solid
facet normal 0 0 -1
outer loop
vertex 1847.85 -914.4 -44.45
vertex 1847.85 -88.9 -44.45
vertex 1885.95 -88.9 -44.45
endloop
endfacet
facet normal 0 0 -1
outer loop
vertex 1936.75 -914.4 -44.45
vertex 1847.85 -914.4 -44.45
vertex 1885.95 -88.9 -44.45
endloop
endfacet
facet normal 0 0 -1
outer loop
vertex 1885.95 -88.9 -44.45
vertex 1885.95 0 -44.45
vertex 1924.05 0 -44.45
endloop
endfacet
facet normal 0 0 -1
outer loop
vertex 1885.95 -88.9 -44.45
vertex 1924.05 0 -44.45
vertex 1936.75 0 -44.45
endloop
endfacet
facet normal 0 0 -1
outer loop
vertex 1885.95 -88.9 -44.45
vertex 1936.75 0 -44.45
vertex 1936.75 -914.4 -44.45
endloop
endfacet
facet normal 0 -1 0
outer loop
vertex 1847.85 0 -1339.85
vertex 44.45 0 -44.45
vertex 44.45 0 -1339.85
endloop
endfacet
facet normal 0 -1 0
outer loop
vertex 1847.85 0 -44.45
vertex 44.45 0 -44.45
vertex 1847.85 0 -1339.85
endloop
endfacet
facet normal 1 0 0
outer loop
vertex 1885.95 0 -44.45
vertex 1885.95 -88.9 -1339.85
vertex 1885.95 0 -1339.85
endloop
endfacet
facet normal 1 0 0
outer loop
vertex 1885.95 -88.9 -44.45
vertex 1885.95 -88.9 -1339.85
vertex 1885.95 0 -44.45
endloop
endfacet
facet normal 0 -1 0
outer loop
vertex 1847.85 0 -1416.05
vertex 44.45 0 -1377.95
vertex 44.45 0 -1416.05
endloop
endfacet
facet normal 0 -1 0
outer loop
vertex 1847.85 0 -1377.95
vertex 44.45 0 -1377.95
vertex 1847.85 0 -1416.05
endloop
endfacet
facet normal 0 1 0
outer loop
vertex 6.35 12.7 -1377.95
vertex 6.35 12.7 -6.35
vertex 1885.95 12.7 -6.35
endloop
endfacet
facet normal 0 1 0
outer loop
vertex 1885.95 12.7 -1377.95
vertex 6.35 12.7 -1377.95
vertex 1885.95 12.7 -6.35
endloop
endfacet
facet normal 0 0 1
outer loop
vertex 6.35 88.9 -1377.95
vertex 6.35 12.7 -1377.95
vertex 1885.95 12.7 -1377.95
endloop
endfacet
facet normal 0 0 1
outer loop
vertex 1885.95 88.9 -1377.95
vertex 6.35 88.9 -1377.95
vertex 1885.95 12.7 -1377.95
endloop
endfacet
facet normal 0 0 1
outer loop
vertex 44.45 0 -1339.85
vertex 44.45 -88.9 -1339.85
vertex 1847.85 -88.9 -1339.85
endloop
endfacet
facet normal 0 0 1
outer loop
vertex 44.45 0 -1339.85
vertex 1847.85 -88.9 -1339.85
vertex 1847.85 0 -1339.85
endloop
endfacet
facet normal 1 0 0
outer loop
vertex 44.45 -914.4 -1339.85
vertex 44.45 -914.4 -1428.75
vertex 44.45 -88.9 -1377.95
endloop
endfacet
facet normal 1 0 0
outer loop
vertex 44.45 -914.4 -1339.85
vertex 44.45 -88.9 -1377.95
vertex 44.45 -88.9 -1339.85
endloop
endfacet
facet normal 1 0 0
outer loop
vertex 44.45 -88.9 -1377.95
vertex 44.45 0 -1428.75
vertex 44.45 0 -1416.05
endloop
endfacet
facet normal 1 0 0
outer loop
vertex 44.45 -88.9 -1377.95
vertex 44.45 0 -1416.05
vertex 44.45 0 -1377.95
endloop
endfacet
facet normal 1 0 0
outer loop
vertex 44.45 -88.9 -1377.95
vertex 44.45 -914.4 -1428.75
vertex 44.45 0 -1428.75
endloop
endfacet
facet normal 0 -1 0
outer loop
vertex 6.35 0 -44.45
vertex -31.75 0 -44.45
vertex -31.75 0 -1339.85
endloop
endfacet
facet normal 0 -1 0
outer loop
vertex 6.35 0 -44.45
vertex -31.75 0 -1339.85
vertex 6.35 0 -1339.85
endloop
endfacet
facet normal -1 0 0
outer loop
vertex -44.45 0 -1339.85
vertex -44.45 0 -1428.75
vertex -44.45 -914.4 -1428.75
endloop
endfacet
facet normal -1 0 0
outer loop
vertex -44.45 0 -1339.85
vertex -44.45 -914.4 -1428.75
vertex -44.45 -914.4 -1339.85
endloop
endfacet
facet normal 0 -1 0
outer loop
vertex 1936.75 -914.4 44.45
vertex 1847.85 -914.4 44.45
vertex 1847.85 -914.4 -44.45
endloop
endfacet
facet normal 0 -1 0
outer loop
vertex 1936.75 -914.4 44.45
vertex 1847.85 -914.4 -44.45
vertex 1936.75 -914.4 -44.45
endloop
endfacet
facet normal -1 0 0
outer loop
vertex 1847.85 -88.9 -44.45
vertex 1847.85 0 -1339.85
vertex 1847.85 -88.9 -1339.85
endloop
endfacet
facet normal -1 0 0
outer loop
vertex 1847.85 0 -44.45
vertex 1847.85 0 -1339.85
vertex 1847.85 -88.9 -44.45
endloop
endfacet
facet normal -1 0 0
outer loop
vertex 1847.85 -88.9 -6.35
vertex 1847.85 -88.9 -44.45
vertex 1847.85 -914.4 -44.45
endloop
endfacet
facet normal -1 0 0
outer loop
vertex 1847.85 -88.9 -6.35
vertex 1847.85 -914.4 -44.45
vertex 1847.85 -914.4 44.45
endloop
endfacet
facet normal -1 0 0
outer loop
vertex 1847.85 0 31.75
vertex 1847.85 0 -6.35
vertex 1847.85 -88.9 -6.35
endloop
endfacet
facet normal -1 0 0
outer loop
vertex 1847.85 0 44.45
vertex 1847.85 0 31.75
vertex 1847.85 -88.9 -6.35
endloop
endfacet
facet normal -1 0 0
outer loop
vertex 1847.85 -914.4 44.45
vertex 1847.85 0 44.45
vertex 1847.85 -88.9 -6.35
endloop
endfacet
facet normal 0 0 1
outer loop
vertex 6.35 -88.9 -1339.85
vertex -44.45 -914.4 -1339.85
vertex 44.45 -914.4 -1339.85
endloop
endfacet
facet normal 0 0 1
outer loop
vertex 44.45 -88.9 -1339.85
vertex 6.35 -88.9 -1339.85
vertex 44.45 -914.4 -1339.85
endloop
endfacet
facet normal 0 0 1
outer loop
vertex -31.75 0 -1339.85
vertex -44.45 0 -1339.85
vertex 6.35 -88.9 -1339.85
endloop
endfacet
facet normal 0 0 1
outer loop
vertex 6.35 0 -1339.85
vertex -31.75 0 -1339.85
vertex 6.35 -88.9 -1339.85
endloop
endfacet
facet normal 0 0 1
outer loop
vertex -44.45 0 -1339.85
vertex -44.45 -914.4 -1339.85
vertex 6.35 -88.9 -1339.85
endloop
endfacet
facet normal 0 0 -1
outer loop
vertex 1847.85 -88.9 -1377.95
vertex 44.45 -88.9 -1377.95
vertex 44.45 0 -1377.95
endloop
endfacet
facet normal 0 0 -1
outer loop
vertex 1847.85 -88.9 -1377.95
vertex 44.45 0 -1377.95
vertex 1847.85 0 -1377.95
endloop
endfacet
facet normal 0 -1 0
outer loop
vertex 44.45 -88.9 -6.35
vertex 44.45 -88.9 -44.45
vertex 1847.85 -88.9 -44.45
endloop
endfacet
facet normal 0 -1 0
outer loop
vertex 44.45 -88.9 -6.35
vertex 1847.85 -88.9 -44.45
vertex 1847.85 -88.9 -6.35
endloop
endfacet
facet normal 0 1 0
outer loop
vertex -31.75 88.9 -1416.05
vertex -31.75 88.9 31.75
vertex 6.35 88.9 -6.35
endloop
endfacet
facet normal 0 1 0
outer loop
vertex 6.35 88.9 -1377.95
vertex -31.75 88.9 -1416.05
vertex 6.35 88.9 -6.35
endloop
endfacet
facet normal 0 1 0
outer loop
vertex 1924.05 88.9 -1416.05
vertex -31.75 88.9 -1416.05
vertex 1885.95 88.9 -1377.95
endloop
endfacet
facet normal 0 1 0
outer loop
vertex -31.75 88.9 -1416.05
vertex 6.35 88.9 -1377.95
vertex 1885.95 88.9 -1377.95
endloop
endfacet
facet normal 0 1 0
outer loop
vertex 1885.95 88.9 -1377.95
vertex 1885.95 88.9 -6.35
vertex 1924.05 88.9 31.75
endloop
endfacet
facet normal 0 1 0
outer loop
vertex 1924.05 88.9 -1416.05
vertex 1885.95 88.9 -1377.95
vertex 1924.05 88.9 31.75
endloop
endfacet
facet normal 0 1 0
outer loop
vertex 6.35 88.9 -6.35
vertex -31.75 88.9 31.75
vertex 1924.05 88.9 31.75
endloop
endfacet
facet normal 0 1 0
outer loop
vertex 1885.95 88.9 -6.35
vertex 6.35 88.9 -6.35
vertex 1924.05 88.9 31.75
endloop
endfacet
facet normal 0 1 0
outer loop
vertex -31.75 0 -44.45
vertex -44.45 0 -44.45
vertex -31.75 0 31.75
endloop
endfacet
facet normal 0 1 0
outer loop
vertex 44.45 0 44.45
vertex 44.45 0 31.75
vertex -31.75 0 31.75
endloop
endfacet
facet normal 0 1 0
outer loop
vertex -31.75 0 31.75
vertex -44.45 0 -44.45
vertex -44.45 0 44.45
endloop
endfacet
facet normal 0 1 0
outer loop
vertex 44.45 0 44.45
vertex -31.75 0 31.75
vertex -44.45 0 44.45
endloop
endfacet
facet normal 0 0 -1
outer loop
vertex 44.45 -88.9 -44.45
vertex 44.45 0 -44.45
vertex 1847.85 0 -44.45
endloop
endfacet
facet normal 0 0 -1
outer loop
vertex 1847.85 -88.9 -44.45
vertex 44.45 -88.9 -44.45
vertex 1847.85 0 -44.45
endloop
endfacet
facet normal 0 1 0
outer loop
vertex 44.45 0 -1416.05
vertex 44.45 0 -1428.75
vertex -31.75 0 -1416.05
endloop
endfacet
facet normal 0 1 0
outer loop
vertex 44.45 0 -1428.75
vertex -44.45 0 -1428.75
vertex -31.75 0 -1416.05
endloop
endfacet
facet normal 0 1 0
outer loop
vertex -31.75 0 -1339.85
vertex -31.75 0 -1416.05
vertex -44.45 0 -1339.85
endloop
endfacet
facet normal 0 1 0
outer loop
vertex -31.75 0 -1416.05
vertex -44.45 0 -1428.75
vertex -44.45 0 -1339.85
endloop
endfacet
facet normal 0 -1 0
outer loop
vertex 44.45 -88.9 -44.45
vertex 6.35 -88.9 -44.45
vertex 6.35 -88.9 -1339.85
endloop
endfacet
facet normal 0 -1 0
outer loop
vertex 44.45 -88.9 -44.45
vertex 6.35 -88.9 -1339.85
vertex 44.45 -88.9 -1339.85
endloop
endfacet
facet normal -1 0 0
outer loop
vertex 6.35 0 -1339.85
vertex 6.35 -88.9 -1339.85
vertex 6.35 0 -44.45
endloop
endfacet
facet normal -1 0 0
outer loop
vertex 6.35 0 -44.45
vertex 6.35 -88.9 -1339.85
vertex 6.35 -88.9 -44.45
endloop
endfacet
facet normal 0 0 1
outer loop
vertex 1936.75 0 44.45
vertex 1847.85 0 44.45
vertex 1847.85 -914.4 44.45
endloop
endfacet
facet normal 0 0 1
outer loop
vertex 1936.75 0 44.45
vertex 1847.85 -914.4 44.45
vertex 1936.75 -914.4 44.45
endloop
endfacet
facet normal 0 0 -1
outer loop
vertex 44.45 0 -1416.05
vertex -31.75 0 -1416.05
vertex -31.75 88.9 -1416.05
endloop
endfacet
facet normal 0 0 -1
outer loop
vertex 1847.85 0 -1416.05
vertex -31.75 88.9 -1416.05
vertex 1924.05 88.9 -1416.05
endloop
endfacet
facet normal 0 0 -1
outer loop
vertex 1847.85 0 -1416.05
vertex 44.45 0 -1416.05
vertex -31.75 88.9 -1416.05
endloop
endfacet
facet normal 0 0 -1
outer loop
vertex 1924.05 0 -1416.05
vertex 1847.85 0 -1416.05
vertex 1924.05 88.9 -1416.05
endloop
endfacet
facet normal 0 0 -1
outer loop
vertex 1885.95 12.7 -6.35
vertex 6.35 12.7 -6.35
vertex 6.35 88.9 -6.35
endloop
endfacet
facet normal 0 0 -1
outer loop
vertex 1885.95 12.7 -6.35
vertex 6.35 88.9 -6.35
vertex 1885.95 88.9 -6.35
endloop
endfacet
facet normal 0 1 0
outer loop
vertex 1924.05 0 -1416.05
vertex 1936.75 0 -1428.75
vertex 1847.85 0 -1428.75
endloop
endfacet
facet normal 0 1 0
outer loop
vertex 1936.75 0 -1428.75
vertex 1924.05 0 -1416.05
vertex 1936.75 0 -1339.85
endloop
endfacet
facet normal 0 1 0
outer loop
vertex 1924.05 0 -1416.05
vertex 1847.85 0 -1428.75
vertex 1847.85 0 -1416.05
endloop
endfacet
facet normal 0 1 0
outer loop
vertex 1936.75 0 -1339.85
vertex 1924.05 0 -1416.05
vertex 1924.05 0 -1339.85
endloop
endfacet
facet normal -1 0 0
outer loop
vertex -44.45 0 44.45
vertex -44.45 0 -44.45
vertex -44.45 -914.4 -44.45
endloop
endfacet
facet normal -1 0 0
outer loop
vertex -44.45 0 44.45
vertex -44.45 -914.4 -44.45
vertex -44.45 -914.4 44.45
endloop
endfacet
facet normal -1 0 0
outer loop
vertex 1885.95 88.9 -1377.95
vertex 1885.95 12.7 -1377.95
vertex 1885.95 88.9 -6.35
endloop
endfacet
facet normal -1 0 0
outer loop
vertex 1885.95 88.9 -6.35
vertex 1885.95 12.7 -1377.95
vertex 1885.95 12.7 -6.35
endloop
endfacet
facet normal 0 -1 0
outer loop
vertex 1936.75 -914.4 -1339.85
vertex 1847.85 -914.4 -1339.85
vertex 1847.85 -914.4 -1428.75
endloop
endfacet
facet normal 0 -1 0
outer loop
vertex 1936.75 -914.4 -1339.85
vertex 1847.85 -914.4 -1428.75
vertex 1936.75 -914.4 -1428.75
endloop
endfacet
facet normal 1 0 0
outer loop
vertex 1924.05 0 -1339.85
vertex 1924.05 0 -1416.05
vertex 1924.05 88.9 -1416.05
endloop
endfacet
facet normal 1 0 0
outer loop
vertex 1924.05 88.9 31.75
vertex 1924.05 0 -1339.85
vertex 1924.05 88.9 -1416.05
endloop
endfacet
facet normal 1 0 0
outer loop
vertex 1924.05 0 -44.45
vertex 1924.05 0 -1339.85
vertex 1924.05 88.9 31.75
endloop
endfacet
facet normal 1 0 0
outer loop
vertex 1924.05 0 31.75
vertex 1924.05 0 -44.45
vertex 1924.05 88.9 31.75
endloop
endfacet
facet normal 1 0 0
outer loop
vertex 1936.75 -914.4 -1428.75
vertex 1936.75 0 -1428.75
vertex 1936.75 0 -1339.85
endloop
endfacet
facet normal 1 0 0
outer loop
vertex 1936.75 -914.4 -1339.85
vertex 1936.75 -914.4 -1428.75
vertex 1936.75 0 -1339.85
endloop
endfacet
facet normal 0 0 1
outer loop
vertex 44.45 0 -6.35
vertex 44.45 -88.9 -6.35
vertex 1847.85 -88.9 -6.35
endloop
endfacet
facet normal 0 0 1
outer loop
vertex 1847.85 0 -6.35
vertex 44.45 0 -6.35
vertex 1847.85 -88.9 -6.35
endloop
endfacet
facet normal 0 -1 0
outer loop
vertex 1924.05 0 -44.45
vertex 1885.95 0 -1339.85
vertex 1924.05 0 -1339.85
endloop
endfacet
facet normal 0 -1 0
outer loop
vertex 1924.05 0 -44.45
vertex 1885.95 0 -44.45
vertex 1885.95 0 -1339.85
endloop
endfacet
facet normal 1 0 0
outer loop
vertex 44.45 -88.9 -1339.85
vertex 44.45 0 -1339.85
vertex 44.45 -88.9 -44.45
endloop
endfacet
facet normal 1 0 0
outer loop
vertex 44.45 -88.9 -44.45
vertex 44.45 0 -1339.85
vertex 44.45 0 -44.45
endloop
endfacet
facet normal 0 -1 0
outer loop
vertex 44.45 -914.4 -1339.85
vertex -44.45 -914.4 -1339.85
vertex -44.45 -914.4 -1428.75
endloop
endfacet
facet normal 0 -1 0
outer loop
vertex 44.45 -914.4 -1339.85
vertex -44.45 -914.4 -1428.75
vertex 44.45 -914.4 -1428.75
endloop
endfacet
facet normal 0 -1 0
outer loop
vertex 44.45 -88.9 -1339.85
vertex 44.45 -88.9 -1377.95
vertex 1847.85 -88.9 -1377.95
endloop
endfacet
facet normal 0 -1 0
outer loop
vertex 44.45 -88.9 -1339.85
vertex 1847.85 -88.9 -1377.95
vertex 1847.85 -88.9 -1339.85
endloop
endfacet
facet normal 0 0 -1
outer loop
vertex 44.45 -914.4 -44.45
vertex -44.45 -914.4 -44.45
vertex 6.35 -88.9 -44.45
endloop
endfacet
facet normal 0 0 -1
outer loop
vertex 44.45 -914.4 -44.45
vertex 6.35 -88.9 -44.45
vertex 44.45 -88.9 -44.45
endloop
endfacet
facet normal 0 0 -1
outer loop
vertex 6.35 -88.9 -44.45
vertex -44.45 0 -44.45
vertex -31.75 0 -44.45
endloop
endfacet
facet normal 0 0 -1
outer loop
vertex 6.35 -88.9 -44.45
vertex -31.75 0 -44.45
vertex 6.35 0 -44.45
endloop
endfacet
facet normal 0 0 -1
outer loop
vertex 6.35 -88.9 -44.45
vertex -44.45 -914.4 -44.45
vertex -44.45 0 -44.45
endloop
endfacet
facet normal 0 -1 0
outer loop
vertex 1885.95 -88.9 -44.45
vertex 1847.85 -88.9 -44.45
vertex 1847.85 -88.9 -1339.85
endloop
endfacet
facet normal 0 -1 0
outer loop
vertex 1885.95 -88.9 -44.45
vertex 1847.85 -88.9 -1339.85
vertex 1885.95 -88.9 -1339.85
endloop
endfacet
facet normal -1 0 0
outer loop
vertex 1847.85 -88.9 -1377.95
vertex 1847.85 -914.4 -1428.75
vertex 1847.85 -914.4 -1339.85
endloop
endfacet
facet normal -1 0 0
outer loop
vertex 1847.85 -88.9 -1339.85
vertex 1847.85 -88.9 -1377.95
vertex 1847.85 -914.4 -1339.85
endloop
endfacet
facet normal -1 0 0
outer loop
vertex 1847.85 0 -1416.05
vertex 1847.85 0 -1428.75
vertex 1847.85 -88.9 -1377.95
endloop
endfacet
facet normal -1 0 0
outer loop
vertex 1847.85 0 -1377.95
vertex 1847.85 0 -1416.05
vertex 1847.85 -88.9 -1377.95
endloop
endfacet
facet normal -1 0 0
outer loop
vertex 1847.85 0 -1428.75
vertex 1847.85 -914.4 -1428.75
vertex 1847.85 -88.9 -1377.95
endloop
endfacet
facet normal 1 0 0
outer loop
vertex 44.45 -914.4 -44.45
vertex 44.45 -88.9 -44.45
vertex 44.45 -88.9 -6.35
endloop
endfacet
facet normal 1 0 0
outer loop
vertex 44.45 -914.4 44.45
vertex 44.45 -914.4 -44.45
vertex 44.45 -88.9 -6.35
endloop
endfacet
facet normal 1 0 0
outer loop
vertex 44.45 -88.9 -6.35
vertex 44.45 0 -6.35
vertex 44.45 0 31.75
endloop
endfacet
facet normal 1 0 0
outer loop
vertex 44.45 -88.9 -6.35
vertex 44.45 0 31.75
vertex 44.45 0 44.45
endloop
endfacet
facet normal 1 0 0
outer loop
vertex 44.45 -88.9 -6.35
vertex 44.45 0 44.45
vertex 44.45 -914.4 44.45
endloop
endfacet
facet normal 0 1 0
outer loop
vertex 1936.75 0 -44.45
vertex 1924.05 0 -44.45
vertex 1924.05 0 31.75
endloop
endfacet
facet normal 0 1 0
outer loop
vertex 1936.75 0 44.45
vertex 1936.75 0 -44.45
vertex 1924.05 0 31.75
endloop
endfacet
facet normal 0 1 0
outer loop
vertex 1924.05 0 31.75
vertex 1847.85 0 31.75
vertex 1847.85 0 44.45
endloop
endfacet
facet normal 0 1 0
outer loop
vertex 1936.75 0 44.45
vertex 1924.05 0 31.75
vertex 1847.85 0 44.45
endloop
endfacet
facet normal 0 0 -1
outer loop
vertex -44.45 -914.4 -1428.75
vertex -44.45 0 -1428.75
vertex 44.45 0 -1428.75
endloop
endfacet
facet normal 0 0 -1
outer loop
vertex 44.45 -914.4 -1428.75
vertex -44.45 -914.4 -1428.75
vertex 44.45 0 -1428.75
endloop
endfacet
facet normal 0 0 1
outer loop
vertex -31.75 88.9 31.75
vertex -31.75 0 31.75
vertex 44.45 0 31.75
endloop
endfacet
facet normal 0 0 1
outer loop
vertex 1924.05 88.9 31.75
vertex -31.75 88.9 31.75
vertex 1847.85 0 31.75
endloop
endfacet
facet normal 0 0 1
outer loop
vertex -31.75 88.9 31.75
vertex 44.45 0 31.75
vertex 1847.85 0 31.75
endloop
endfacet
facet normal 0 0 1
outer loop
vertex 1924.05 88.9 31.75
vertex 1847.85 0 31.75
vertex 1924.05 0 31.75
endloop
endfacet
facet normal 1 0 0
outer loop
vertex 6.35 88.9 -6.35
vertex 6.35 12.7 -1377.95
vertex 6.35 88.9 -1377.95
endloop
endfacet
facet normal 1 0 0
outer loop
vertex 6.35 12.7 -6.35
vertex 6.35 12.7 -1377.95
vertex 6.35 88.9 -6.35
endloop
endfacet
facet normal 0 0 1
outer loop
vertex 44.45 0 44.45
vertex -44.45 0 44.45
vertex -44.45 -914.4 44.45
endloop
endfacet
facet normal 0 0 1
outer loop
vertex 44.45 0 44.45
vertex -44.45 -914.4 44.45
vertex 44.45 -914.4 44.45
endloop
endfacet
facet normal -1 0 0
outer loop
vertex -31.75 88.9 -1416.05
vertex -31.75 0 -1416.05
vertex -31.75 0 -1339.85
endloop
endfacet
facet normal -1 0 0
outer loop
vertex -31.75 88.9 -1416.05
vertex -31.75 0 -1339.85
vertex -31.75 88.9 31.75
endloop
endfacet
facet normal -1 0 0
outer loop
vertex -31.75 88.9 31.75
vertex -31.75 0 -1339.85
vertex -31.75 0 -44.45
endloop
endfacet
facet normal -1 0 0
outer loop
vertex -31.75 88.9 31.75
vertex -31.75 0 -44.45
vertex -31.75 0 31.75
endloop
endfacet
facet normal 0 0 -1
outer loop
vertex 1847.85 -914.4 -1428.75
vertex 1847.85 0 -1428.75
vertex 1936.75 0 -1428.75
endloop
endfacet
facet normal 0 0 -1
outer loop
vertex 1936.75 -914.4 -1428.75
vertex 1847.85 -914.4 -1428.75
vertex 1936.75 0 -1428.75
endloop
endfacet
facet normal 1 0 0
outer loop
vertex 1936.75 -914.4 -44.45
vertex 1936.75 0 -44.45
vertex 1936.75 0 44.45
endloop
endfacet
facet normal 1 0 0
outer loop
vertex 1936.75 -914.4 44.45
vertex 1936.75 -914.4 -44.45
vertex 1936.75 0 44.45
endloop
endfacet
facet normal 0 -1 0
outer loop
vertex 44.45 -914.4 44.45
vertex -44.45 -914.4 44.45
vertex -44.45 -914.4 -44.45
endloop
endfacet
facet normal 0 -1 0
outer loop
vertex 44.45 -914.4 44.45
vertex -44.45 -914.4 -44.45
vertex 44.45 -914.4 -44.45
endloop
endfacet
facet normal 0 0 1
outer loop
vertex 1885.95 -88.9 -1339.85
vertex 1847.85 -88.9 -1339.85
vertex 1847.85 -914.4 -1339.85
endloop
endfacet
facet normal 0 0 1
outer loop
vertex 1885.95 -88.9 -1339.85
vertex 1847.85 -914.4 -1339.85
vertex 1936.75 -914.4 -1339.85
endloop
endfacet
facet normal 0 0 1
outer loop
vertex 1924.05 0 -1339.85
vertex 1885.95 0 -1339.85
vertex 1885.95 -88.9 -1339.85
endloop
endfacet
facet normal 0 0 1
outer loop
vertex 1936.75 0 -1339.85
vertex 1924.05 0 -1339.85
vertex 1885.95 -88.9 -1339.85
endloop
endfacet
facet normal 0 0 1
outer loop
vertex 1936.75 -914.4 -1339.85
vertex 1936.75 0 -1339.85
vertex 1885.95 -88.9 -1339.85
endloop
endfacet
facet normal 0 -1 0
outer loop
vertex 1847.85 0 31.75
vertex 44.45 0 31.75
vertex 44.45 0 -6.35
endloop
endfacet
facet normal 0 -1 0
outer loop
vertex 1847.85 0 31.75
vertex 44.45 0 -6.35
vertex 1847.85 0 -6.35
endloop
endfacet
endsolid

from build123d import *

# Parameters (mm, degrees)
F0_W      = 88.9
F0_H      = 88.9
F1_DEPTH  = 914.4
F2_W      = 88.9
F2_H      = 38.1
F3_DEPTH  = 1803.4
F4_W      = 88.9
F4_H      = 88.9
F5_DEPTH  = 914.4
F6_W      = 38.1
F6_H      = 88.9
F7_DEPTH  = 1295.4
F8_W      = 88.9
F8_H      = 88.9
F9_DEPTH  = 914.4
F10_W     = 38.1
F10_H     = 88.9
F11_DEPTH = 1295.4
F12_W     = 88.9
F12_H     = 88.9
F13_DEPTH = 914.4
F14_W     = 88.9
F14_H     = 38.1
F15_DEPTH = 1803.4
F16_W     = 1879.6
F16_H     = 1371.6
F17_DEPTH = 12.7
F18_W     = 1955.8
F18_H     = 1447.8
F18_W_2   = 1879.6
F18_H_2   = 1371.6
F19_DEPTH = 88.9


with BuildPart() as f1:
    # F0 (on Front) → F1 (new body)
    with BuildSketch(Plane.XZ):
        Rectangle(F0_W, F0_H)
    extrude(amount=F1_DEPTH)

    # F2 (on face) → F3 (join)
    with BuildSketch(Plane.YZ.offset(44.45)):
        with Locations((-44.45, -25.4)):
            Rectangle(F2_W, F2_H)
    extrude(amount=F3_DEPTH)

    # F4 (on Front) → F5 (join)
    with BuildSketch(Plane.XZ):
        with Locations((1892.3, 0)):
            Rectangle(F4_W, F4_H)
    extrude(amount=F5_DEPTH)

    # F6 (on face) → F7 (join)
    with BuildSketch(Plane(origin=(0, 0, -44.45), x_dir=(1, 0, 0), z_dir=(0, 0, -1))):
        with Locations((1866.9, 44.45)):
            Rectangle(F6_W, F6_H)
    extrude(amount=F7_DEPTH)

    # F8 (on Front) → F9 (join)
    with BuildSketch(Plane.XZ):
        with Locations((1892.3, -1384.3)):
            Rectangle(F8_W, F8_H)
    extrude(amount=F9_DEPTH)

    # F10 (on face) → F11 (join)
    with BuildSketch(Plane(origin=(0, 0, -44.45), x_dir=(1, 0, 0), z_dir=(0, 0, -1))):
        with Locations((25.4, 44.45)):
            Rectangle(F10_W, F10_H)
    extrude(amount=F11_DEPTH)

    # F12 (on Front) → F13 (join)
    with BuildSketch(Plane.XZ):
        with Locations((0, -1384.3)):
            Rectangle(F12_W, F12_H)
    extrude(amount=F13_DEPTH)

    # F14 (on face) → F15 (join)
    with BuildSketch(Plane.YZ.offset(44.45)):
        with Locations((-44.45, -1358.9)):
            Rectangle(F14_W, F14_H)
    extrude(amount=F15_DEPTH)

    # F16 (on Front) → F17 (join)
    with BuildSketch(Plane.XZ):
        with Locations((946.15, -692.15)):
            Rectangle(F16_W, F16_H)
    extrude(amount=-F17_DEPTH)

    # F18 (on Front) → F19 (join)
    with BuildSketch(Plane.XZ):
        with Locations((946.15, -692.15)):
            Rectangle(F18_W, F18_H)
        with Locations((946.15, -692.15)):
            Rectangle(F18_W_2, F18_H_2, mode=Mode.SUBTRACT)
    extrude(amount=-F19_DEPTH)


solid = f1.part
